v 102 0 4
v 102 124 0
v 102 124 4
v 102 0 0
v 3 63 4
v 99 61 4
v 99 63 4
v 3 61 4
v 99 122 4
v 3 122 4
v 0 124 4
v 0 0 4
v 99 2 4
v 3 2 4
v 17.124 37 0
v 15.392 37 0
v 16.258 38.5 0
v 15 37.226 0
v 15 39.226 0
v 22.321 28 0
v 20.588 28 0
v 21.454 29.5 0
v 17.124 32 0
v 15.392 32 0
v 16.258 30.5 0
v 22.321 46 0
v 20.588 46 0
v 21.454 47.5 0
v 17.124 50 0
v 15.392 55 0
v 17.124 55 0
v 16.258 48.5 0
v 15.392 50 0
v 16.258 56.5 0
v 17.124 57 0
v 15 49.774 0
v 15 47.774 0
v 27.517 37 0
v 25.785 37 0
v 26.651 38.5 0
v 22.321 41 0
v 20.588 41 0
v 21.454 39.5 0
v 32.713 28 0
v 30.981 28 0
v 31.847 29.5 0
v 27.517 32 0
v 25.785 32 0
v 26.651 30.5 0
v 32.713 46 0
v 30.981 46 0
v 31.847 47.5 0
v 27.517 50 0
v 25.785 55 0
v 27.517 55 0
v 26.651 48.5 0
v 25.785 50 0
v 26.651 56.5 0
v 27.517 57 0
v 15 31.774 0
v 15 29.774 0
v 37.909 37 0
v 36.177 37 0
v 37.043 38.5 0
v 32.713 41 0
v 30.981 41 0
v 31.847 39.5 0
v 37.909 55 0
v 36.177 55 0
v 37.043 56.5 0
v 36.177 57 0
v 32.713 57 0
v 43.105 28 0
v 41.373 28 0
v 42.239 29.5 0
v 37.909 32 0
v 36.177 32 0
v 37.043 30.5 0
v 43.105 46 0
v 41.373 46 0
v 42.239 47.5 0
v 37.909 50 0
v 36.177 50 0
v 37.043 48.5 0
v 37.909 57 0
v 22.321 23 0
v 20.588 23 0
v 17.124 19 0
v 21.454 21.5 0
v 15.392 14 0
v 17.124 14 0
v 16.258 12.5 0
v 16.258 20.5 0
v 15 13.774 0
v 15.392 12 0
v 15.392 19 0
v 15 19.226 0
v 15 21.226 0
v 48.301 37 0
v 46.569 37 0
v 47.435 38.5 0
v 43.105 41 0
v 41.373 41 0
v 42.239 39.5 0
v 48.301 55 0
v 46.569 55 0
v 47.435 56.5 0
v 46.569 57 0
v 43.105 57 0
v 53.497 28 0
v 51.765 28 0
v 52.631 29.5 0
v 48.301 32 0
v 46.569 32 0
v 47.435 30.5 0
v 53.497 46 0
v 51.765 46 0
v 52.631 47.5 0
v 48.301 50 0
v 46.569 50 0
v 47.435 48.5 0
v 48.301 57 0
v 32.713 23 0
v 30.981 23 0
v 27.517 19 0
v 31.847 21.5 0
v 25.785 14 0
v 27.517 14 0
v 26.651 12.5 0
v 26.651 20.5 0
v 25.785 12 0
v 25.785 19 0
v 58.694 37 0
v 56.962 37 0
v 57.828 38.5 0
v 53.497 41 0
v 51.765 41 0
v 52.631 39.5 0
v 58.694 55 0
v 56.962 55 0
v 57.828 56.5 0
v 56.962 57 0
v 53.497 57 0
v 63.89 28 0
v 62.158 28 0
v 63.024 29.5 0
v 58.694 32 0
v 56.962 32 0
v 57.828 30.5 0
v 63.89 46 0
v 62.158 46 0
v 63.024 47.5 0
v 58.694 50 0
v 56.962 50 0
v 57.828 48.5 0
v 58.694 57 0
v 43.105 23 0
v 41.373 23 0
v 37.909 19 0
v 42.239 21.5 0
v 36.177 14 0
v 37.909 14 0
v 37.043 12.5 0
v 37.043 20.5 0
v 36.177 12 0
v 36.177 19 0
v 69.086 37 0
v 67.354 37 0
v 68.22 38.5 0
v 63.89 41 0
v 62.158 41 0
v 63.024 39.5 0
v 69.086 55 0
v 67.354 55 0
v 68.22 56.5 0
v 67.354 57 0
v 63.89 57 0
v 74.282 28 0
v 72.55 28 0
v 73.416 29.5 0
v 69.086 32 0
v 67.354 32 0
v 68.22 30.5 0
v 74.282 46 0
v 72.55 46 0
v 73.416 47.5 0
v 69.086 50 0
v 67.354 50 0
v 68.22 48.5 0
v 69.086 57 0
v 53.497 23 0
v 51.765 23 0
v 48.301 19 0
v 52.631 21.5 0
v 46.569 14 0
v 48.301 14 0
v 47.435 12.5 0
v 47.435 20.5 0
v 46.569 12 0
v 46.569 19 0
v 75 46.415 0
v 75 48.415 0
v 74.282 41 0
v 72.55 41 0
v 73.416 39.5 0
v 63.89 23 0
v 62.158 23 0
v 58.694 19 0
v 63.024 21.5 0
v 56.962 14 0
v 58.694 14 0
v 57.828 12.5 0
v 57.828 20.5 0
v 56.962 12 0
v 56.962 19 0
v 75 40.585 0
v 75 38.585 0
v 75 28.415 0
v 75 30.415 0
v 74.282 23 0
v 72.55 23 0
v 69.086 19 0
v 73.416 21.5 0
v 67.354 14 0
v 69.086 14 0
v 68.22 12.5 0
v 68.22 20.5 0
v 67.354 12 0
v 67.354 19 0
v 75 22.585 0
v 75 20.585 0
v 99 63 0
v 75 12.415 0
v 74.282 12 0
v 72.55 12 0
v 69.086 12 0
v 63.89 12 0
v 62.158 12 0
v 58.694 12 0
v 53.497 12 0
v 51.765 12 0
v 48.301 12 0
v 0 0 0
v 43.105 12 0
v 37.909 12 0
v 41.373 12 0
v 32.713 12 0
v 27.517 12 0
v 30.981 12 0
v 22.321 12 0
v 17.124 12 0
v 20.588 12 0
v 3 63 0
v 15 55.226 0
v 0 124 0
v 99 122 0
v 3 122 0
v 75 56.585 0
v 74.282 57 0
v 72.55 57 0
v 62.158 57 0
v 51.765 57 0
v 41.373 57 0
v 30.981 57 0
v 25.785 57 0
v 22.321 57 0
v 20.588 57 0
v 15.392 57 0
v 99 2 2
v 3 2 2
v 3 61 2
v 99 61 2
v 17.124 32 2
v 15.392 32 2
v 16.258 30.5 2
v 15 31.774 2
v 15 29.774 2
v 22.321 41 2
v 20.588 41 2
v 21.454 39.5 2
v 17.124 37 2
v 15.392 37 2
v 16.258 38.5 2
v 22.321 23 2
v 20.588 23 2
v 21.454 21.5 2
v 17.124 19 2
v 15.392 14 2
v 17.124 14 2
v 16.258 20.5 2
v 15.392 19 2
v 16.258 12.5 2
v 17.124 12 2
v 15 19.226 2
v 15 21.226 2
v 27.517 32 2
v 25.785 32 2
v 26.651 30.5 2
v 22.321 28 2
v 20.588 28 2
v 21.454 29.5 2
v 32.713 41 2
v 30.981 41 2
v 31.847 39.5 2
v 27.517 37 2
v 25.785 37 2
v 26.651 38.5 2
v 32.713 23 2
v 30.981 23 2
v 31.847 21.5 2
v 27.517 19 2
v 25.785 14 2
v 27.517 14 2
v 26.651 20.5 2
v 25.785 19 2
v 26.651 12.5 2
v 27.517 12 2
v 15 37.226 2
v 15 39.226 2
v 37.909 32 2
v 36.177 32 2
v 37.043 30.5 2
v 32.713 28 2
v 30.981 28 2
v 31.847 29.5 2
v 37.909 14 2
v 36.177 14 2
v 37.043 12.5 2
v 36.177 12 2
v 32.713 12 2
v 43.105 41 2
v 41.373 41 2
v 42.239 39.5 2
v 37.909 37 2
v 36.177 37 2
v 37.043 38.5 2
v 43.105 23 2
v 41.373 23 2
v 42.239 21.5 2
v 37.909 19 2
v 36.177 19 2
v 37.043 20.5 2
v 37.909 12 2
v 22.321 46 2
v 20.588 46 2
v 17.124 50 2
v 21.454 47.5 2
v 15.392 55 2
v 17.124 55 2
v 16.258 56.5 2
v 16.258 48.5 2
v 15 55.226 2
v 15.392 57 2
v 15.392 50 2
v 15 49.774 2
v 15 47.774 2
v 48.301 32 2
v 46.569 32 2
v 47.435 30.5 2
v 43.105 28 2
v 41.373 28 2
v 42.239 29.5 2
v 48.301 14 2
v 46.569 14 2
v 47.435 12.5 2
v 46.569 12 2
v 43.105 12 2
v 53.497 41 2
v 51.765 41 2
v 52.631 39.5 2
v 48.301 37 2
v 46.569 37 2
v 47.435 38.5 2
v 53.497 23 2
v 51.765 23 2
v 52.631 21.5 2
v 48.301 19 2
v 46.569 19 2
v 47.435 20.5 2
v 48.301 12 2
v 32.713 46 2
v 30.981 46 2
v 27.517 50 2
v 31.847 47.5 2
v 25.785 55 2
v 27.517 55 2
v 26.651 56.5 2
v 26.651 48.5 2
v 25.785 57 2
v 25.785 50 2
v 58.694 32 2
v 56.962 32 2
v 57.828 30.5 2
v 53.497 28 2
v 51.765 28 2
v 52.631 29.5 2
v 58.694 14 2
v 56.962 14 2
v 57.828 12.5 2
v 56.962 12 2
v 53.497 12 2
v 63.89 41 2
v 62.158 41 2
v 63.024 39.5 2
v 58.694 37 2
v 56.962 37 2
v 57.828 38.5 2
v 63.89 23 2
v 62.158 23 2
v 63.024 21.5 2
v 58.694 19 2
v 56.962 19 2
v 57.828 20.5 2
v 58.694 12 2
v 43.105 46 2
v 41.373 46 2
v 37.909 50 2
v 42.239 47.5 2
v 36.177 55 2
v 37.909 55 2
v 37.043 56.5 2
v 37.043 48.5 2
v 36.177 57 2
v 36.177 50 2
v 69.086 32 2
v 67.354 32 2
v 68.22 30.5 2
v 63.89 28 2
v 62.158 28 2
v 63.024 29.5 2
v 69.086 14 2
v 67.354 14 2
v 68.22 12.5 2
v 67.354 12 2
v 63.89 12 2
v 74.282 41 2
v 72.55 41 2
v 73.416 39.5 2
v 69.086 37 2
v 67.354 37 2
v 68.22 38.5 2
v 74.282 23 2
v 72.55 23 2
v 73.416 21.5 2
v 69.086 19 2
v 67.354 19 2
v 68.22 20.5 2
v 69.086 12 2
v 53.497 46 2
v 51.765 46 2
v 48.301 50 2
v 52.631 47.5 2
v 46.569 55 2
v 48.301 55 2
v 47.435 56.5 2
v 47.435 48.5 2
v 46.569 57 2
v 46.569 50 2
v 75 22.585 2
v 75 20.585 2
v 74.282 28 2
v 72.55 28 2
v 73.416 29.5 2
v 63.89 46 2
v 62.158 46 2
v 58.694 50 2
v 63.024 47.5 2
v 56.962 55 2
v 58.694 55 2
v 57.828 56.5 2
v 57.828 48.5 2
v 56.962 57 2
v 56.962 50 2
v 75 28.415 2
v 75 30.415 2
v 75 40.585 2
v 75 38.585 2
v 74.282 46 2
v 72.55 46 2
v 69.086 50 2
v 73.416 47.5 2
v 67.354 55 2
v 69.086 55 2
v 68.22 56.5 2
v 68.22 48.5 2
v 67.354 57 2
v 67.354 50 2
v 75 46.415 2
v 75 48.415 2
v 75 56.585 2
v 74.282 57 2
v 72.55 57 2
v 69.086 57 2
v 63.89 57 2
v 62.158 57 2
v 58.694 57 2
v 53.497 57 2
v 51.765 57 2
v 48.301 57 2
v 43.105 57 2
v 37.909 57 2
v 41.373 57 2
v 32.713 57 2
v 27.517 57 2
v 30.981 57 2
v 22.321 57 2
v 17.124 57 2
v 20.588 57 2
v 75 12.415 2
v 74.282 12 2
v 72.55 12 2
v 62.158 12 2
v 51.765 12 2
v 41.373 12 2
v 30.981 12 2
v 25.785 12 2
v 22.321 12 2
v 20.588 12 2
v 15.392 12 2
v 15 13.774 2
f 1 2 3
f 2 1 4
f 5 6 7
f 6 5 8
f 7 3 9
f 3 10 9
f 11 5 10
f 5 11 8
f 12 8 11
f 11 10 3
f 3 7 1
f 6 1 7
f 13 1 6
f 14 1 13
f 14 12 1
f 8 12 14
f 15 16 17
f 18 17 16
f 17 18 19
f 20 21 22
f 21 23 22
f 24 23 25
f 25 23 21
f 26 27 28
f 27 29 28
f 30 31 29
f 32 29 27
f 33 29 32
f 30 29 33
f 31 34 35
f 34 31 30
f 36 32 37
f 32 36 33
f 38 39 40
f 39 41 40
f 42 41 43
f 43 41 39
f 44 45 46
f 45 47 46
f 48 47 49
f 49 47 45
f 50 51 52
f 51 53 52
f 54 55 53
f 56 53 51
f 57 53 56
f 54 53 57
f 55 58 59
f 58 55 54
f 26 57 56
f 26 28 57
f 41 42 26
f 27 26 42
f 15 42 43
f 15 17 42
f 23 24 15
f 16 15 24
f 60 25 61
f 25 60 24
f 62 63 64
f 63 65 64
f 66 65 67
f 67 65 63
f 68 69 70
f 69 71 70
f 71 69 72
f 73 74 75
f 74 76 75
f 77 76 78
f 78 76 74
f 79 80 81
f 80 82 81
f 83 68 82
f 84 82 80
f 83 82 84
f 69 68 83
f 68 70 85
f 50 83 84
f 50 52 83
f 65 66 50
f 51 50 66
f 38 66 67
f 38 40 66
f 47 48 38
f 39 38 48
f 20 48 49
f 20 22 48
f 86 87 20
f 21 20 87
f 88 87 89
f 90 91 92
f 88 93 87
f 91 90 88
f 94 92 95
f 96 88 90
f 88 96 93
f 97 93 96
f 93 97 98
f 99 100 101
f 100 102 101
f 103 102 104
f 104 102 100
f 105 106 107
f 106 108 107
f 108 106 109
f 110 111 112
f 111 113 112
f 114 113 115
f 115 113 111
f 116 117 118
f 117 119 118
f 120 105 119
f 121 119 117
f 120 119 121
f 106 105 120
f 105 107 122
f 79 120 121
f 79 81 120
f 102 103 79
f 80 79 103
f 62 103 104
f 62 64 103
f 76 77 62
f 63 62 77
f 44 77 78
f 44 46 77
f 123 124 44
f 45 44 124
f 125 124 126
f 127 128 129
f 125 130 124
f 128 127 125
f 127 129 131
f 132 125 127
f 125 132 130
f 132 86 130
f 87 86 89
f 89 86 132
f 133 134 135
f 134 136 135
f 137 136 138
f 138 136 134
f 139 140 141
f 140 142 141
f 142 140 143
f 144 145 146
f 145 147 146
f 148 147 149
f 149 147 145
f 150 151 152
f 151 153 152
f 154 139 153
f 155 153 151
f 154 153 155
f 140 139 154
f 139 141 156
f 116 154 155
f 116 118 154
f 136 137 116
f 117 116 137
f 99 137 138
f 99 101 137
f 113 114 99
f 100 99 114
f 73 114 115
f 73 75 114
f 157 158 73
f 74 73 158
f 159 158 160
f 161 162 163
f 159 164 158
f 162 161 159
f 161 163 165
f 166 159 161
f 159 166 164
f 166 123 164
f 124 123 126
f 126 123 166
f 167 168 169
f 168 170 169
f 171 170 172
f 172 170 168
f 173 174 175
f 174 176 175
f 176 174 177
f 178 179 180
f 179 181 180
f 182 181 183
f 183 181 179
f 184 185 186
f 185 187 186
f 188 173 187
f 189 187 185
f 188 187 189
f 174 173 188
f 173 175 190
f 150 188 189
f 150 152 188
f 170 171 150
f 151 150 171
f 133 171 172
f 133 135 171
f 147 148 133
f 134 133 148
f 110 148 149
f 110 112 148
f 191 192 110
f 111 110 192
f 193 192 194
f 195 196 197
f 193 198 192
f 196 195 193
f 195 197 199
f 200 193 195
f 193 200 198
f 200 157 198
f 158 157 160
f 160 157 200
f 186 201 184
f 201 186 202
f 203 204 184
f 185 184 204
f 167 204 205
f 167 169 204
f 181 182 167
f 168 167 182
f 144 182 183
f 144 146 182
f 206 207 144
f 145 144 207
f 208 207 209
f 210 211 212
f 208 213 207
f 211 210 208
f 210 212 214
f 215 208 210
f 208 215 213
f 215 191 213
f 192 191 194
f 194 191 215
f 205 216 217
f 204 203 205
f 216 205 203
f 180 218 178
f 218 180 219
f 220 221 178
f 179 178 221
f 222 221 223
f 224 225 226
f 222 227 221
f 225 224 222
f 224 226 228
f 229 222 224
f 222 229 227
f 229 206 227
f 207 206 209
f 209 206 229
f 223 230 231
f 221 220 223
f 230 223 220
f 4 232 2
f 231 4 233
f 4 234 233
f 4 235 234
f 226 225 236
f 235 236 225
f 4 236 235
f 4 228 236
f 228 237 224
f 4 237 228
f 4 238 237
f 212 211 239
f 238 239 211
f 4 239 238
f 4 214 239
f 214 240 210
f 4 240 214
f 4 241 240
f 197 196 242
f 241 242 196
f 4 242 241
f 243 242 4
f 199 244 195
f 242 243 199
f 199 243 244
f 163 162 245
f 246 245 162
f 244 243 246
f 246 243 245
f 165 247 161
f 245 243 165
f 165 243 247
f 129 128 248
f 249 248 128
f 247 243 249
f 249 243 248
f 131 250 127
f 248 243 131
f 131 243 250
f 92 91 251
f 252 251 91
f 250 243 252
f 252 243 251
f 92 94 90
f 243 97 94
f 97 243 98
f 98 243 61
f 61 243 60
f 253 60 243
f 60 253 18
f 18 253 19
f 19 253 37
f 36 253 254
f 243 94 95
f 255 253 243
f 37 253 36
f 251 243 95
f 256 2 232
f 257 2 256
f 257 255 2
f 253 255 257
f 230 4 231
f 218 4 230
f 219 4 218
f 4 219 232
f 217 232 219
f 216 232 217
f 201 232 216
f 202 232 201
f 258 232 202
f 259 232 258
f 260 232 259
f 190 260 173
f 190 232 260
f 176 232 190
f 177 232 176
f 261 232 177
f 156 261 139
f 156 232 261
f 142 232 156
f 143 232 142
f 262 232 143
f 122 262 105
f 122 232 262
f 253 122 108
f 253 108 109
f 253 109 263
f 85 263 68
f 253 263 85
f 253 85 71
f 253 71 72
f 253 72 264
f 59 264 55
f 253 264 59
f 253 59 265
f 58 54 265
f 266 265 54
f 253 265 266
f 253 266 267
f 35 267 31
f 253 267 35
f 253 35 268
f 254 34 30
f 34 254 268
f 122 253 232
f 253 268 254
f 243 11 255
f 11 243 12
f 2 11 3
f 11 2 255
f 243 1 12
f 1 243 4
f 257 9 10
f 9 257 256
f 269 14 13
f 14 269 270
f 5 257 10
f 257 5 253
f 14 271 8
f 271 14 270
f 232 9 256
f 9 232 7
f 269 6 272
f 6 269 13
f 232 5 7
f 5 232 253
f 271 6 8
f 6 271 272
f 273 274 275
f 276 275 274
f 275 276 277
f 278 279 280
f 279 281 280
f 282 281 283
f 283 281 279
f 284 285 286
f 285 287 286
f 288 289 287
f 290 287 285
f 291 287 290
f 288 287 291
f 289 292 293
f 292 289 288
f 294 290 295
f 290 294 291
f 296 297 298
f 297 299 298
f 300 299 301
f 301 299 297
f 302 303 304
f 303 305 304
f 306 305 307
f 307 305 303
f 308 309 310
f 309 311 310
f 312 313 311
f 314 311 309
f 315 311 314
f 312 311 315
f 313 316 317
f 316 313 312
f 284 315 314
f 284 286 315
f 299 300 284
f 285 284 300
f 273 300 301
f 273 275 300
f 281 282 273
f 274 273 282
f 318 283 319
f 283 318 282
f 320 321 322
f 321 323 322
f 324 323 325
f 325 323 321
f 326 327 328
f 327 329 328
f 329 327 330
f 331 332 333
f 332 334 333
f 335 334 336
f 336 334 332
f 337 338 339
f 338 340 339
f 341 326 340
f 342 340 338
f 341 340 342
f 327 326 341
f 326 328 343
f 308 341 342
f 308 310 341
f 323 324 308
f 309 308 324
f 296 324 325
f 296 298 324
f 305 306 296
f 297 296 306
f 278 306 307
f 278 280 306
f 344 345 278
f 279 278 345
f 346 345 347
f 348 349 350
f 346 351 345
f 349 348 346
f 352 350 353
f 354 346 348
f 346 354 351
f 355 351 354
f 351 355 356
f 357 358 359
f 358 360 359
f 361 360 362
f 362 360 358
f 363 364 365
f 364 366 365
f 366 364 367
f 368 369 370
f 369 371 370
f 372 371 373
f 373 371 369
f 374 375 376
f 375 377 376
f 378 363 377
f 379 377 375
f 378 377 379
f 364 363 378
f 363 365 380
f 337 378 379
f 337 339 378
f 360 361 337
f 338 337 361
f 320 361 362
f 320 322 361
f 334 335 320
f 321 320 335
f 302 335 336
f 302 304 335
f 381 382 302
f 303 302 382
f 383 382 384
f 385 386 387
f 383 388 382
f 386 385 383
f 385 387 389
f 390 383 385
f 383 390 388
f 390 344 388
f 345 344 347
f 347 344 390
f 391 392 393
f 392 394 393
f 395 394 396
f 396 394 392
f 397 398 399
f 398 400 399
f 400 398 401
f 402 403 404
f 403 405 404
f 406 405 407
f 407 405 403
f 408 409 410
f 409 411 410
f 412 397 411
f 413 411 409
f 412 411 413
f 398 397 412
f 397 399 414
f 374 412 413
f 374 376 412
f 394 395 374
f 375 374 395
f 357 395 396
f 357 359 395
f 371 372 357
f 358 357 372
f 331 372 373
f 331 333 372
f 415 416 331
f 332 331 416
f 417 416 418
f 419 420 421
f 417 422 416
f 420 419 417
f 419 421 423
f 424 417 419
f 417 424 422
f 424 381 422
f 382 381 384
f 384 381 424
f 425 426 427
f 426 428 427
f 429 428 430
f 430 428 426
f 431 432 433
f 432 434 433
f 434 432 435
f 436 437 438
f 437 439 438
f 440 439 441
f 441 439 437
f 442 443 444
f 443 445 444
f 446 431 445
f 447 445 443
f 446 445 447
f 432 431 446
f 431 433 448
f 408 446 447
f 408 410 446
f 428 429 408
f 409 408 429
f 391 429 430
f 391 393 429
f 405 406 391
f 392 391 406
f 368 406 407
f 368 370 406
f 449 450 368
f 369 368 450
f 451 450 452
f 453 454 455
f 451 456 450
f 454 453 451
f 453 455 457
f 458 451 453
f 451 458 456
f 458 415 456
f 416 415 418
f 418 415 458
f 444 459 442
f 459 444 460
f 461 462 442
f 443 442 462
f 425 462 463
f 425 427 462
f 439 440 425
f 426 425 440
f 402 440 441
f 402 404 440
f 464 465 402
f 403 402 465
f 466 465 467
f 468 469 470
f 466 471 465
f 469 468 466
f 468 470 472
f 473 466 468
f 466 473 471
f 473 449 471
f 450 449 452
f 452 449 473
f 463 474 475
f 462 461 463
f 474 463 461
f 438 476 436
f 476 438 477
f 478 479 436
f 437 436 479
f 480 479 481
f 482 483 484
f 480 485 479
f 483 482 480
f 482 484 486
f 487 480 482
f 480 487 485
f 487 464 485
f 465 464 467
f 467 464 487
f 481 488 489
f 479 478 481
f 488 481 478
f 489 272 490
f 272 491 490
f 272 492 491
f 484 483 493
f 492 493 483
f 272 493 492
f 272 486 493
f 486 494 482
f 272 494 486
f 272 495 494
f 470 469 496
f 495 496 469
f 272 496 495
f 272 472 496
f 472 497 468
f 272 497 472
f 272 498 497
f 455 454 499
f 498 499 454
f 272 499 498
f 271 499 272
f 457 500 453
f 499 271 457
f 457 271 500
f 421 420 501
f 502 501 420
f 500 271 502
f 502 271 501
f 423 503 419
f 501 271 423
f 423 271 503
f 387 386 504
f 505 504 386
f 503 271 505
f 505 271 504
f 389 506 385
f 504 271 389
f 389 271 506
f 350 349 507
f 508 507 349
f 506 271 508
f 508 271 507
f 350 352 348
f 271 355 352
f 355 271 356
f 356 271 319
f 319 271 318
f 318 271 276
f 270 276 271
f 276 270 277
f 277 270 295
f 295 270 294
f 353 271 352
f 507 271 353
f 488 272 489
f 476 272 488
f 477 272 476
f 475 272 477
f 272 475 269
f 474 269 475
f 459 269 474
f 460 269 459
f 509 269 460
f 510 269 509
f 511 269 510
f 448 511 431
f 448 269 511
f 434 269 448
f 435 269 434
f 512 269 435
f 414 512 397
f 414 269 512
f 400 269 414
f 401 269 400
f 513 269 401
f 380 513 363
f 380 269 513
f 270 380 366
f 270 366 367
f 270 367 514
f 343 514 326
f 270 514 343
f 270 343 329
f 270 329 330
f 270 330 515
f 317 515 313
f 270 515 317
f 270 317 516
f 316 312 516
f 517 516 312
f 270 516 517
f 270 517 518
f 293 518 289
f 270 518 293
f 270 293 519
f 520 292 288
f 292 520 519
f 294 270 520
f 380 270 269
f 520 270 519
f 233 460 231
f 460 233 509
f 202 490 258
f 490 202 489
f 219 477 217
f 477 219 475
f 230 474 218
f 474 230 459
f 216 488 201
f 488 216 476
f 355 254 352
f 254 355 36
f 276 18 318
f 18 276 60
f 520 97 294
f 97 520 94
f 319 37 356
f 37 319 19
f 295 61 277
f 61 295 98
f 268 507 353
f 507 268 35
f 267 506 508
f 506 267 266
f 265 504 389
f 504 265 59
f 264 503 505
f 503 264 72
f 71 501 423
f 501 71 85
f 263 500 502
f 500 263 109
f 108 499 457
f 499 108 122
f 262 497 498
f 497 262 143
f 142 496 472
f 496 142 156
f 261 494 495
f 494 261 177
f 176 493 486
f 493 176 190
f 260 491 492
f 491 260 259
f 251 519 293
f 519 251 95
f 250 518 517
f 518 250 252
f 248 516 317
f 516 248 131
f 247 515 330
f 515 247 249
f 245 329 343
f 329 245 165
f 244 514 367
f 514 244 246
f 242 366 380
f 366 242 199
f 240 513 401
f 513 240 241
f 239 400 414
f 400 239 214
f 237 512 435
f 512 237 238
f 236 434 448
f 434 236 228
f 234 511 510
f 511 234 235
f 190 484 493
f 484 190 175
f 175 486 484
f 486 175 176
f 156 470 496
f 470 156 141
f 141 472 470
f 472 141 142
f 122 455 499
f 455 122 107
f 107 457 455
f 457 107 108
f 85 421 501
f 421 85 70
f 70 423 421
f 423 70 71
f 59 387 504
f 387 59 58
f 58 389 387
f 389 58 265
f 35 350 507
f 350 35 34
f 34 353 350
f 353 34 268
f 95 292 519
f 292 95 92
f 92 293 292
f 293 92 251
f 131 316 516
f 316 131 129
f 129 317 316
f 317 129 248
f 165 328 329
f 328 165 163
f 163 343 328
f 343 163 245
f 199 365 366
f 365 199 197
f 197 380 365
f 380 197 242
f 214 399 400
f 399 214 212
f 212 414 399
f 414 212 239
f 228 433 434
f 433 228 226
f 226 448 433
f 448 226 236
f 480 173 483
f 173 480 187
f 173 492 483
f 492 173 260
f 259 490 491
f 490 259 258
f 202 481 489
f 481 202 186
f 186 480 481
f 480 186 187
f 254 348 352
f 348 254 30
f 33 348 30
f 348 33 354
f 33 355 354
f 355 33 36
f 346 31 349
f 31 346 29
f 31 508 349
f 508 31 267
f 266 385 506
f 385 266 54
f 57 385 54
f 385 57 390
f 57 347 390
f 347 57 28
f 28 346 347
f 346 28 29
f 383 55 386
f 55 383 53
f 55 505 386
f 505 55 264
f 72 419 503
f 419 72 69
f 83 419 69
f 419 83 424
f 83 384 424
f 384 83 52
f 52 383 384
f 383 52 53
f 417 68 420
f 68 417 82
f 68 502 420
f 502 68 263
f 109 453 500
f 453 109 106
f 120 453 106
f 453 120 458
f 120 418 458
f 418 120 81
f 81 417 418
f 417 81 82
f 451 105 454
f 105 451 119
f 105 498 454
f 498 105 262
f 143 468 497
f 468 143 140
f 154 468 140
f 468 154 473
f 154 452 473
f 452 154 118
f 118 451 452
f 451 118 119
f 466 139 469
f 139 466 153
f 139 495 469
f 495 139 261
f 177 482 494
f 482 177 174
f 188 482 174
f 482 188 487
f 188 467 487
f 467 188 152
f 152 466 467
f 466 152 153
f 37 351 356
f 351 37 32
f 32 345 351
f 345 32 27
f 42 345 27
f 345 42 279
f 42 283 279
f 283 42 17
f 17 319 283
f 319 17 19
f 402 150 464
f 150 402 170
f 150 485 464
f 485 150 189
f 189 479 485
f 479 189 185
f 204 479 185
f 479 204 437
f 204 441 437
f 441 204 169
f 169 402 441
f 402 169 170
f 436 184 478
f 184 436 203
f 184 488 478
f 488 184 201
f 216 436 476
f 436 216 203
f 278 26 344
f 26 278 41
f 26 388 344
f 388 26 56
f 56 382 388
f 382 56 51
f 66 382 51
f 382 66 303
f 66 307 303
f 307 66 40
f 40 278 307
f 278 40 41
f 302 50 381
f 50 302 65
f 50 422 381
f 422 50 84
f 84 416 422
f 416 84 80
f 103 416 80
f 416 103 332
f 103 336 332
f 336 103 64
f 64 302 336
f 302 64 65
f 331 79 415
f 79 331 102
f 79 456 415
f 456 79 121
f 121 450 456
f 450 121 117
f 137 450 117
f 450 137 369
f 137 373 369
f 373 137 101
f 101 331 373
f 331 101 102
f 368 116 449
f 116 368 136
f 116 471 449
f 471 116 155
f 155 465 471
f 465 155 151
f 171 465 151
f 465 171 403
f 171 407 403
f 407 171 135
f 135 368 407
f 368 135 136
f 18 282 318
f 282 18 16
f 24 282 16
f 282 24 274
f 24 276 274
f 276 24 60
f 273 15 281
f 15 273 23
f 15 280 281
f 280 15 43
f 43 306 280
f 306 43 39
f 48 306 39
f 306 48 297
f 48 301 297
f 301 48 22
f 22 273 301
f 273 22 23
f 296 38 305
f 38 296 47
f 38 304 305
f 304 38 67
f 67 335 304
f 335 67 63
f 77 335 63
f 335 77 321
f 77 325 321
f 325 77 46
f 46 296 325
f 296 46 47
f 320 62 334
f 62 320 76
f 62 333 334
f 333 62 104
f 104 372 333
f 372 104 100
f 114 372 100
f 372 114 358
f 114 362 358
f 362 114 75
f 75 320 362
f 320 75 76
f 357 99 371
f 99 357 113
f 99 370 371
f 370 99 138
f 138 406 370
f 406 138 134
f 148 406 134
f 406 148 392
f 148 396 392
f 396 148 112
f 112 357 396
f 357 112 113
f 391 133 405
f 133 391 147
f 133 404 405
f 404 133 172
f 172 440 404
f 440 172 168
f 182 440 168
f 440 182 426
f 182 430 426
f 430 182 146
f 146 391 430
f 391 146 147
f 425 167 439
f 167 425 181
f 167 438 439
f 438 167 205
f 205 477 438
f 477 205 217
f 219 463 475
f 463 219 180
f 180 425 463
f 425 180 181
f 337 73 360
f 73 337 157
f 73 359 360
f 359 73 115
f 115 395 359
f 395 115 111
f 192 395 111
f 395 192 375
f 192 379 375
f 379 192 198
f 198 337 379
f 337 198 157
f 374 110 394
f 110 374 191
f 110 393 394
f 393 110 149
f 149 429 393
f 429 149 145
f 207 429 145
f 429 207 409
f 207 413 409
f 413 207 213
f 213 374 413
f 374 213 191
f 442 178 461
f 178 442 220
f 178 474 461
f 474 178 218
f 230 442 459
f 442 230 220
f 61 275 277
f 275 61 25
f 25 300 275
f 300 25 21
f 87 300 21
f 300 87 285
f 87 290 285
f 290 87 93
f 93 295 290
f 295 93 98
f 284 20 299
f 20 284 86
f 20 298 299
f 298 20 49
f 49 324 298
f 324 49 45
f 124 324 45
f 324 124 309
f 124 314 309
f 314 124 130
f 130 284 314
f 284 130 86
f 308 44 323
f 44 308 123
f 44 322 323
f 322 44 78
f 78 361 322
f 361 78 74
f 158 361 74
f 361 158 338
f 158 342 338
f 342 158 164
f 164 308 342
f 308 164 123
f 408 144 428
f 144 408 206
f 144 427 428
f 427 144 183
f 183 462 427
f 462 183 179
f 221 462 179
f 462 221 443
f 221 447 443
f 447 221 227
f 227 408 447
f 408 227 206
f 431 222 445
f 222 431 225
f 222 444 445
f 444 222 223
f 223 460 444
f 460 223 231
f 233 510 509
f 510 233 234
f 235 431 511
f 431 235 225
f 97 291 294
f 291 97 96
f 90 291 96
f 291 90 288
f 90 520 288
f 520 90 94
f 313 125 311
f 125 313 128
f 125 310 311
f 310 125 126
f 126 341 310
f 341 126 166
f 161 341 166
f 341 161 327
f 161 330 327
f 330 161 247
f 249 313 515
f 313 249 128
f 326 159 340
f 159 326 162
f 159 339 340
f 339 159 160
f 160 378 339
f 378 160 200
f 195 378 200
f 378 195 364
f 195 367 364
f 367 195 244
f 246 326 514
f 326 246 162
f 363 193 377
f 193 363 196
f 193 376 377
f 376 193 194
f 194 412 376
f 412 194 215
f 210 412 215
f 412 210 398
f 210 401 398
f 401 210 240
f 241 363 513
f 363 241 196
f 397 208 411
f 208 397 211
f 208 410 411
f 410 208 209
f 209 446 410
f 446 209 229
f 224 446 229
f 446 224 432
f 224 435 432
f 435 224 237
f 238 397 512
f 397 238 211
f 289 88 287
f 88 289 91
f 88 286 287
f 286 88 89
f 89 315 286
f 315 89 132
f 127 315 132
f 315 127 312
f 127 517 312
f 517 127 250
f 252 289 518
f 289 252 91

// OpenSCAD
// lab kits for rPi and arduino
// (c) 2021 John J. Tran

module drawer_divider(width=76, depth=76, height=25, external_wall=1, internal_wall=2, x_compartments=3, y_compartments=2, floor_thickness=1, floor=0)
{
	difference() {
		cube([width,depth,height]);
		translate([external_wall,external_wall,-1])
			cube([width-external_wall*2,depth-external_wall*2,height+2]);
	}

	for (x_comp=[1:x_compartments-1])
		translate([x_comp/x_compartments*(width-external_wall*2)-internal_wall/2+external_wall,0,0])
			cube([internal_wall,depth,height]);

	for (y_comp=[1:y_compartments-1])
		translate([0,y_comp/y_compartments*(depth-external_wall*2)-internal_wall/2+external_wall,0])
			cube([width,internal_wall,height]);

	if (floor==1) {
		difference() {
			cube([width,depth,floor_thickness]);
			// translate([10,10,0]) linear_extrude(floor_thickness) text("abb-mega-v2", size=6);
		}
	}
}

module honeycomb(r, thickness=1, cols=0, rows=0, center=false) {
  translate([ // if center is true, calculate total size and translate accordingly
    center ? ( cols * r / tan(30) + (r + thickness) / tan(30) / 2 ) /-2 : 0,
    center ? ( rows * r * sin(30) + (rows+0.5) * r + thickness ) /-2 : 0
  ])
  translate([ (r+thickness/2) / 2 / tan(30), r+thickness/2])  // Move so it starts at 0, 0
  for (j = [ 0 : 1 : rows-1 ] ) {  // Iterate rows
    translate([ r / 2 / tan(30) * (j%2) , j * (r + r * sin(30)) ])
    for (i = [ 0 : 1 : cols-1 ]) { // Iterate columns
      translate([ i * ( r / tan(30) ) , 0]) rotate([0, 0, 90]) {

        // Make the hexagons
        if (thickness==0) {
          circle(r, $fn=6);
        }
        else {
          difference() {
            circle(r+thickness/2, $fn=6);
            circle(r-thickness/2, $fn=6);
          }
        }
      }
    }
  }
}

// outer box
translate([0,0,0]) union() {
    w = 102; d = 124; h = 4;
    drawer_divider(width=w, depth=d, height=h,
        internal_wall=2.0,
        external_wall=2.0,
        x_compartments=1,
        y_compartments=2,
        floor_thickness=2.0,
        floor=0);
}

// lower box
translate([0,2,0]) union() {
  h = 2;
  difference() {
    cube([100,60,h]);
    translate([15,10,0]) cube([60,45,h]);
  }

  translate([5,7.5,0]) linear_extrude(height=h) honeycomb(r=6, thickness=2, cols=7, rows=5, center=false);
}

// upper box
translate([0,63,0]) difference() {

    difference() {
        dx = 102; dy = 90; dz = 4;
        x1 = 0.0; y1 = 0.0; z1 = 0.0;
        // translate([x1, y1 ,z1]) cube([dx,dy,dz]);
        // translate([x1+10, y1+2 ,z1]) cube([dx-34,dy-35,dz]);
    }

    union() {
        dx = 2.3; dy = 4.5; dz = 4.0;
        x1 = 8.0;
        y1 = 4.0;
        y2 = y1 + 23.0;
        y3 = y2 + 23.0;

        // translate([x1,y1,0]) cube([dx,dy,dz]);
        // translate([x1,y2,0]) cube([dx,dy,dz]);
        // translate([x1,y3,0]) cube([dx,dy,dz]);
    }

    union() {
        dx = 4.5; dy = 2.3; dz = 8.0;
        y1 = 59.0;
        x1 = 15.0;
        x2 = x1 + 54.5;

        // translate([x1,y1,0]) cube([dx,dy,dz]);
        // translate([x2,y1,0]) cube([dx,dy,dz]);
    }

}
